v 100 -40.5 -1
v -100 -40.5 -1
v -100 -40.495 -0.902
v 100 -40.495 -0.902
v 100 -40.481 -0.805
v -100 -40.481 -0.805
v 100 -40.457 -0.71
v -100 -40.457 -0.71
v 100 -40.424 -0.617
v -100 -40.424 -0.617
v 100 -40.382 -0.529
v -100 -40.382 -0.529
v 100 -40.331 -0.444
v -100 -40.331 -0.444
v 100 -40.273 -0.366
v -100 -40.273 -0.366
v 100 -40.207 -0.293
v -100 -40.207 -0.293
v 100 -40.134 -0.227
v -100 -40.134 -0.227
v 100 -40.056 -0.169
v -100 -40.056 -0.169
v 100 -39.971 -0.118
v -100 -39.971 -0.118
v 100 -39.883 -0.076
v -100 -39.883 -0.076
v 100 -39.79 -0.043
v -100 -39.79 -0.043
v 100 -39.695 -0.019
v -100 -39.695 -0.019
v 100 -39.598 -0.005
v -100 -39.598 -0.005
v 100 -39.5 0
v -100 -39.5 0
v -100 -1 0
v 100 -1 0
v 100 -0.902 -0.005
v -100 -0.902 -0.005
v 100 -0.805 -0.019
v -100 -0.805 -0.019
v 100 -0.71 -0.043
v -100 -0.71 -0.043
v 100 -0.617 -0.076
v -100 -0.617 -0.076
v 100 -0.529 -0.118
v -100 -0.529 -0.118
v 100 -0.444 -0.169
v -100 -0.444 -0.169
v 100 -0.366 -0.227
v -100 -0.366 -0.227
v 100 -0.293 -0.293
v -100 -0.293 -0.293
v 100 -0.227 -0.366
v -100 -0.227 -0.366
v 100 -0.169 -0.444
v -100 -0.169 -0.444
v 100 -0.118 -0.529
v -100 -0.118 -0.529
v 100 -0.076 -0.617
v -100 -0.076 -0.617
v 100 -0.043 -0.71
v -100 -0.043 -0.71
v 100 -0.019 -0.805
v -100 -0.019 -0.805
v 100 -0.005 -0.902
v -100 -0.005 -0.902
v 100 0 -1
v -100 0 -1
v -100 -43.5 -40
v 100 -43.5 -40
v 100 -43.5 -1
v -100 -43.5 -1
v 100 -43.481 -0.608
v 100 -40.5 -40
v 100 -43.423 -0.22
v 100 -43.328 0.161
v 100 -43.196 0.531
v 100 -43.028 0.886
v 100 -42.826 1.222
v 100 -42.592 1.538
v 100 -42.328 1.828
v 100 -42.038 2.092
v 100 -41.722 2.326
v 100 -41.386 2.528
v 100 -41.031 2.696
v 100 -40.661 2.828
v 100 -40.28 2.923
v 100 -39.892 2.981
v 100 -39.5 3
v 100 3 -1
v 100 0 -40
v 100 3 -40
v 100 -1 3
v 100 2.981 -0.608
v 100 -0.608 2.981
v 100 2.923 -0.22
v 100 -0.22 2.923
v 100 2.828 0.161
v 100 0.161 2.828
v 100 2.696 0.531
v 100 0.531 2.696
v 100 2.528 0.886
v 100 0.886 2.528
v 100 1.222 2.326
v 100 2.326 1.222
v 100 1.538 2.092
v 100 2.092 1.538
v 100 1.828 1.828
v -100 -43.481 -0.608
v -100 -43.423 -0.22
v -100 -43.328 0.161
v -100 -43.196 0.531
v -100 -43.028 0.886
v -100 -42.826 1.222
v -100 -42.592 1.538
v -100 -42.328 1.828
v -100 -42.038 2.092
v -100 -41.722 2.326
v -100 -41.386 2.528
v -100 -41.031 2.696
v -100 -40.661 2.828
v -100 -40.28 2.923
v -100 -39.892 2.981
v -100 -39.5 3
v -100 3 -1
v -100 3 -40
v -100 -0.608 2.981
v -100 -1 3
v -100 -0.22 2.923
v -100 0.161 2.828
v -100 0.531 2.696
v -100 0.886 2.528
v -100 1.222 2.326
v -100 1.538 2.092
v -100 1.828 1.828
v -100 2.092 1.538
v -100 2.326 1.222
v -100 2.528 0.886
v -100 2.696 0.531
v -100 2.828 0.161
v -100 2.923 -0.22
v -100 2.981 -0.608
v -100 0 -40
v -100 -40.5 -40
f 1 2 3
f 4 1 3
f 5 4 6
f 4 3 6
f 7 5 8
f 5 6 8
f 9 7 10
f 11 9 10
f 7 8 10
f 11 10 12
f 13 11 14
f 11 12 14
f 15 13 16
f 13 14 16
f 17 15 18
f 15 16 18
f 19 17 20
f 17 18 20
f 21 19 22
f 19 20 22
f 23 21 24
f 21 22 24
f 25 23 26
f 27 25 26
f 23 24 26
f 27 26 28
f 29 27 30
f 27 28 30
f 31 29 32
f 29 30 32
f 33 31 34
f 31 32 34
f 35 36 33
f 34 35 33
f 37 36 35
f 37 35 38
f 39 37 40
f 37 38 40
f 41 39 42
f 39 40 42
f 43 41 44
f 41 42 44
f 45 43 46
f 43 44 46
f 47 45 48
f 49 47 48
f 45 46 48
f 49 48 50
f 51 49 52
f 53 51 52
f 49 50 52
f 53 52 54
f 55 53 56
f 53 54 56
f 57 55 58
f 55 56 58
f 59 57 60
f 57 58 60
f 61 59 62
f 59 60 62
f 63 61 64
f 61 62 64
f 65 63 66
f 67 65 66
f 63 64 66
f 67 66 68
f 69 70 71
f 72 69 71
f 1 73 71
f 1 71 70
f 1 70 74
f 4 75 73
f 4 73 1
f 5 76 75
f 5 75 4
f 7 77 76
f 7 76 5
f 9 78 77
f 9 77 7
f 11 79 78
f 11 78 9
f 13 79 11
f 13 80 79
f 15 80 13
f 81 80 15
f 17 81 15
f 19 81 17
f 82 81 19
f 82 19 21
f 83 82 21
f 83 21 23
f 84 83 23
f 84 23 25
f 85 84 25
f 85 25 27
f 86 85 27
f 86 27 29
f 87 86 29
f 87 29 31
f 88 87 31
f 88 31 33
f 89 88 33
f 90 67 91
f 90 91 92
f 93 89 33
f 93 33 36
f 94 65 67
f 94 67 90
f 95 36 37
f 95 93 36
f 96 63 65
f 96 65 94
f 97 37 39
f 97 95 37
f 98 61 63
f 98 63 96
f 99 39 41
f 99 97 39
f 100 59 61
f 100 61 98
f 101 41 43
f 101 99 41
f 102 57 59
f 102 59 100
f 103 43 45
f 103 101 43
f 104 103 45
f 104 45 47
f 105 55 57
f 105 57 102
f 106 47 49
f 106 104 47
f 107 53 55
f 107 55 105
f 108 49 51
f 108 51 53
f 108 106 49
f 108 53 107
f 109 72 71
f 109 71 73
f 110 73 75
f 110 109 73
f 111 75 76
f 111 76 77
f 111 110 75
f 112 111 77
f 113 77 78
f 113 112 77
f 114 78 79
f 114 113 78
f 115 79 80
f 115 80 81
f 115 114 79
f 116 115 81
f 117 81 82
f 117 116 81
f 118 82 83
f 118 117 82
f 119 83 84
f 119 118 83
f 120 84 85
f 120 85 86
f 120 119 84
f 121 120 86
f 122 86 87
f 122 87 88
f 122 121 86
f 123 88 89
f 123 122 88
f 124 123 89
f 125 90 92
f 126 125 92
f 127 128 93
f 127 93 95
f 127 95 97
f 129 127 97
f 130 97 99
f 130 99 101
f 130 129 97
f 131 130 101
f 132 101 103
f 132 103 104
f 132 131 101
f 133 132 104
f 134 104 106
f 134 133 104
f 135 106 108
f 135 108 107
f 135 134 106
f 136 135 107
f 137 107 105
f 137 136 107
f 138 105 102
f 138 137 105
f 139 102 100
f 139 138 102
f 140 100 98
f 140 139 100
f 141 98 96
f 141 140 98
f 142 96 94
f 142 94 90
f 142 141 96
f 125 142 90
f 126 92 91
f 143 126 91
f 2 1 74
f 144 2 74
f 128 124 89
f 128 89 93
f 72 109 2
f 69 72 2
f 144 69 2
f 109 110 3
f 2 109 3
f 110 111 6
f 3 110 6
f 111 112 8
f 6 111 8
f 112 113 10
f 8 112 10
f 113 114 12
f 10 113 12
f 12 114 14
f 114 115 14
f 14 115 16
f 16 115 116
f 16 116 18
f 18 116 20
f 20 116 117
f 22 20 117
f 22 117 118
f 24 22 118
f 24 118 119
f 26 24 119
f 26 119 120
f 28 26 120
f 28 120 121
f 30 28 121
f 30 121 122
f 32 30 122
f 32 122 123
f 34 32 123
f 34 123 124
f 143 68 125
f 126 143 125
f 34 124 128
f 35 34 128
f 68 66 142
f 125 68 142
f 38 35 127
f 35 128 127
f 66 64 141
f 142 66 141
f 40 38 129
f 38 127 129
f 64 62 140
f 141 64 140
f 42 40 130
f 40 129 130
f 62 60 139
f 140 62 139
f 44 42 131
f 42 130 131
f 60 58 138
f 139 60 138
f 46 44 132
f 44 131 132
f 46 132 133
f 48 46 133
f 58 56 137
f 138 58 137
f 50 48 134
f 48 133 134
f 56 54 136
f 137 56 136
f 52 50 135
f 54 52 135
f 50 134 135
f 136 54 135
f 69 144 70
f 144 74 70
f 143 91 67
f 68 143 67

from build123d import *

# Parameters (mm, degrees)
BOSS_EXTRUDE1_DEPTH    = 100
CONVERT_SOLID1_START   = -100
CONVERT_SOLID1_DEPTH   = 200
CONVERT_SOLID1_2_DEPTH = 200


# Read off the part's stored shape, not the designer's step: Convert-Solid1
with BuildPart() as part:
    # Sketch1 → Boss-Extrude1 (new, symmetric)
    with BuildSketch(Plane(origin=(0, 0, 0), x_dir=(0, 0, -1), z_dir=(1, 0, 0))):
        Polygon((0, 0), (0, -40.5), (40, -40.5), (40, -43.5), (-3, -43.5), (-3, 3), (40, 3), (40, 0), align=None)
    extrude(amount=BOSS_EXTRUDE1_DEPTH, both=True)

    # Convert-Solid1 outline → Convert-Solid1 (cut)
    with BuildSketch(Plane.YZ.offset(CONVERT_SOLID1_START)):
        with BuildLine():
            Line((3, 3), (-1, 3))
            ThreePointArc((-1, 3), (1.828427125, 1.828427125), (3, -1))
            Line((3, -1), (3, 3))
        make_face()
        with BuildLine():
            ThreePointArc((-43.5, -1), (-42.328427125, 1.828427125), (-39.5, 3))
            Line((-39.5, 3), (-43.5, 3))
            Line((-43.5, 3), (-43.5, -1))
        make_face()
    extrude(amount=CONVERT_SOLID1_DEPTH, mode=Mode.SUBTRACT)

    # Convert-Solid1 2 outline → Convert-Solid1 2 (add)
    with BuildSketch(Plane.YZ.offset(CONVERT_SOLID1_START)):
        with BuildLine():
            Line((0, 0), (-1, 0))
            ThreePointArc((-1, 0), (-0.292893219, -0.292893219), (0, -1))
            Line((0, -1), (0, 0))
        make_face()
        with BuildLine():
            ThreePointArc((-40.5, -1), (-40.207106781, -0.292893219), (-39.5, 0))
            Line((-39.5, 0), (-40.5, 0))
            Line((-40.5, 0), (-40.5, -1))
        make_face()
    extrude(amount=CONVERT_SOLID1_2_DEPTH)


solid = part.part
